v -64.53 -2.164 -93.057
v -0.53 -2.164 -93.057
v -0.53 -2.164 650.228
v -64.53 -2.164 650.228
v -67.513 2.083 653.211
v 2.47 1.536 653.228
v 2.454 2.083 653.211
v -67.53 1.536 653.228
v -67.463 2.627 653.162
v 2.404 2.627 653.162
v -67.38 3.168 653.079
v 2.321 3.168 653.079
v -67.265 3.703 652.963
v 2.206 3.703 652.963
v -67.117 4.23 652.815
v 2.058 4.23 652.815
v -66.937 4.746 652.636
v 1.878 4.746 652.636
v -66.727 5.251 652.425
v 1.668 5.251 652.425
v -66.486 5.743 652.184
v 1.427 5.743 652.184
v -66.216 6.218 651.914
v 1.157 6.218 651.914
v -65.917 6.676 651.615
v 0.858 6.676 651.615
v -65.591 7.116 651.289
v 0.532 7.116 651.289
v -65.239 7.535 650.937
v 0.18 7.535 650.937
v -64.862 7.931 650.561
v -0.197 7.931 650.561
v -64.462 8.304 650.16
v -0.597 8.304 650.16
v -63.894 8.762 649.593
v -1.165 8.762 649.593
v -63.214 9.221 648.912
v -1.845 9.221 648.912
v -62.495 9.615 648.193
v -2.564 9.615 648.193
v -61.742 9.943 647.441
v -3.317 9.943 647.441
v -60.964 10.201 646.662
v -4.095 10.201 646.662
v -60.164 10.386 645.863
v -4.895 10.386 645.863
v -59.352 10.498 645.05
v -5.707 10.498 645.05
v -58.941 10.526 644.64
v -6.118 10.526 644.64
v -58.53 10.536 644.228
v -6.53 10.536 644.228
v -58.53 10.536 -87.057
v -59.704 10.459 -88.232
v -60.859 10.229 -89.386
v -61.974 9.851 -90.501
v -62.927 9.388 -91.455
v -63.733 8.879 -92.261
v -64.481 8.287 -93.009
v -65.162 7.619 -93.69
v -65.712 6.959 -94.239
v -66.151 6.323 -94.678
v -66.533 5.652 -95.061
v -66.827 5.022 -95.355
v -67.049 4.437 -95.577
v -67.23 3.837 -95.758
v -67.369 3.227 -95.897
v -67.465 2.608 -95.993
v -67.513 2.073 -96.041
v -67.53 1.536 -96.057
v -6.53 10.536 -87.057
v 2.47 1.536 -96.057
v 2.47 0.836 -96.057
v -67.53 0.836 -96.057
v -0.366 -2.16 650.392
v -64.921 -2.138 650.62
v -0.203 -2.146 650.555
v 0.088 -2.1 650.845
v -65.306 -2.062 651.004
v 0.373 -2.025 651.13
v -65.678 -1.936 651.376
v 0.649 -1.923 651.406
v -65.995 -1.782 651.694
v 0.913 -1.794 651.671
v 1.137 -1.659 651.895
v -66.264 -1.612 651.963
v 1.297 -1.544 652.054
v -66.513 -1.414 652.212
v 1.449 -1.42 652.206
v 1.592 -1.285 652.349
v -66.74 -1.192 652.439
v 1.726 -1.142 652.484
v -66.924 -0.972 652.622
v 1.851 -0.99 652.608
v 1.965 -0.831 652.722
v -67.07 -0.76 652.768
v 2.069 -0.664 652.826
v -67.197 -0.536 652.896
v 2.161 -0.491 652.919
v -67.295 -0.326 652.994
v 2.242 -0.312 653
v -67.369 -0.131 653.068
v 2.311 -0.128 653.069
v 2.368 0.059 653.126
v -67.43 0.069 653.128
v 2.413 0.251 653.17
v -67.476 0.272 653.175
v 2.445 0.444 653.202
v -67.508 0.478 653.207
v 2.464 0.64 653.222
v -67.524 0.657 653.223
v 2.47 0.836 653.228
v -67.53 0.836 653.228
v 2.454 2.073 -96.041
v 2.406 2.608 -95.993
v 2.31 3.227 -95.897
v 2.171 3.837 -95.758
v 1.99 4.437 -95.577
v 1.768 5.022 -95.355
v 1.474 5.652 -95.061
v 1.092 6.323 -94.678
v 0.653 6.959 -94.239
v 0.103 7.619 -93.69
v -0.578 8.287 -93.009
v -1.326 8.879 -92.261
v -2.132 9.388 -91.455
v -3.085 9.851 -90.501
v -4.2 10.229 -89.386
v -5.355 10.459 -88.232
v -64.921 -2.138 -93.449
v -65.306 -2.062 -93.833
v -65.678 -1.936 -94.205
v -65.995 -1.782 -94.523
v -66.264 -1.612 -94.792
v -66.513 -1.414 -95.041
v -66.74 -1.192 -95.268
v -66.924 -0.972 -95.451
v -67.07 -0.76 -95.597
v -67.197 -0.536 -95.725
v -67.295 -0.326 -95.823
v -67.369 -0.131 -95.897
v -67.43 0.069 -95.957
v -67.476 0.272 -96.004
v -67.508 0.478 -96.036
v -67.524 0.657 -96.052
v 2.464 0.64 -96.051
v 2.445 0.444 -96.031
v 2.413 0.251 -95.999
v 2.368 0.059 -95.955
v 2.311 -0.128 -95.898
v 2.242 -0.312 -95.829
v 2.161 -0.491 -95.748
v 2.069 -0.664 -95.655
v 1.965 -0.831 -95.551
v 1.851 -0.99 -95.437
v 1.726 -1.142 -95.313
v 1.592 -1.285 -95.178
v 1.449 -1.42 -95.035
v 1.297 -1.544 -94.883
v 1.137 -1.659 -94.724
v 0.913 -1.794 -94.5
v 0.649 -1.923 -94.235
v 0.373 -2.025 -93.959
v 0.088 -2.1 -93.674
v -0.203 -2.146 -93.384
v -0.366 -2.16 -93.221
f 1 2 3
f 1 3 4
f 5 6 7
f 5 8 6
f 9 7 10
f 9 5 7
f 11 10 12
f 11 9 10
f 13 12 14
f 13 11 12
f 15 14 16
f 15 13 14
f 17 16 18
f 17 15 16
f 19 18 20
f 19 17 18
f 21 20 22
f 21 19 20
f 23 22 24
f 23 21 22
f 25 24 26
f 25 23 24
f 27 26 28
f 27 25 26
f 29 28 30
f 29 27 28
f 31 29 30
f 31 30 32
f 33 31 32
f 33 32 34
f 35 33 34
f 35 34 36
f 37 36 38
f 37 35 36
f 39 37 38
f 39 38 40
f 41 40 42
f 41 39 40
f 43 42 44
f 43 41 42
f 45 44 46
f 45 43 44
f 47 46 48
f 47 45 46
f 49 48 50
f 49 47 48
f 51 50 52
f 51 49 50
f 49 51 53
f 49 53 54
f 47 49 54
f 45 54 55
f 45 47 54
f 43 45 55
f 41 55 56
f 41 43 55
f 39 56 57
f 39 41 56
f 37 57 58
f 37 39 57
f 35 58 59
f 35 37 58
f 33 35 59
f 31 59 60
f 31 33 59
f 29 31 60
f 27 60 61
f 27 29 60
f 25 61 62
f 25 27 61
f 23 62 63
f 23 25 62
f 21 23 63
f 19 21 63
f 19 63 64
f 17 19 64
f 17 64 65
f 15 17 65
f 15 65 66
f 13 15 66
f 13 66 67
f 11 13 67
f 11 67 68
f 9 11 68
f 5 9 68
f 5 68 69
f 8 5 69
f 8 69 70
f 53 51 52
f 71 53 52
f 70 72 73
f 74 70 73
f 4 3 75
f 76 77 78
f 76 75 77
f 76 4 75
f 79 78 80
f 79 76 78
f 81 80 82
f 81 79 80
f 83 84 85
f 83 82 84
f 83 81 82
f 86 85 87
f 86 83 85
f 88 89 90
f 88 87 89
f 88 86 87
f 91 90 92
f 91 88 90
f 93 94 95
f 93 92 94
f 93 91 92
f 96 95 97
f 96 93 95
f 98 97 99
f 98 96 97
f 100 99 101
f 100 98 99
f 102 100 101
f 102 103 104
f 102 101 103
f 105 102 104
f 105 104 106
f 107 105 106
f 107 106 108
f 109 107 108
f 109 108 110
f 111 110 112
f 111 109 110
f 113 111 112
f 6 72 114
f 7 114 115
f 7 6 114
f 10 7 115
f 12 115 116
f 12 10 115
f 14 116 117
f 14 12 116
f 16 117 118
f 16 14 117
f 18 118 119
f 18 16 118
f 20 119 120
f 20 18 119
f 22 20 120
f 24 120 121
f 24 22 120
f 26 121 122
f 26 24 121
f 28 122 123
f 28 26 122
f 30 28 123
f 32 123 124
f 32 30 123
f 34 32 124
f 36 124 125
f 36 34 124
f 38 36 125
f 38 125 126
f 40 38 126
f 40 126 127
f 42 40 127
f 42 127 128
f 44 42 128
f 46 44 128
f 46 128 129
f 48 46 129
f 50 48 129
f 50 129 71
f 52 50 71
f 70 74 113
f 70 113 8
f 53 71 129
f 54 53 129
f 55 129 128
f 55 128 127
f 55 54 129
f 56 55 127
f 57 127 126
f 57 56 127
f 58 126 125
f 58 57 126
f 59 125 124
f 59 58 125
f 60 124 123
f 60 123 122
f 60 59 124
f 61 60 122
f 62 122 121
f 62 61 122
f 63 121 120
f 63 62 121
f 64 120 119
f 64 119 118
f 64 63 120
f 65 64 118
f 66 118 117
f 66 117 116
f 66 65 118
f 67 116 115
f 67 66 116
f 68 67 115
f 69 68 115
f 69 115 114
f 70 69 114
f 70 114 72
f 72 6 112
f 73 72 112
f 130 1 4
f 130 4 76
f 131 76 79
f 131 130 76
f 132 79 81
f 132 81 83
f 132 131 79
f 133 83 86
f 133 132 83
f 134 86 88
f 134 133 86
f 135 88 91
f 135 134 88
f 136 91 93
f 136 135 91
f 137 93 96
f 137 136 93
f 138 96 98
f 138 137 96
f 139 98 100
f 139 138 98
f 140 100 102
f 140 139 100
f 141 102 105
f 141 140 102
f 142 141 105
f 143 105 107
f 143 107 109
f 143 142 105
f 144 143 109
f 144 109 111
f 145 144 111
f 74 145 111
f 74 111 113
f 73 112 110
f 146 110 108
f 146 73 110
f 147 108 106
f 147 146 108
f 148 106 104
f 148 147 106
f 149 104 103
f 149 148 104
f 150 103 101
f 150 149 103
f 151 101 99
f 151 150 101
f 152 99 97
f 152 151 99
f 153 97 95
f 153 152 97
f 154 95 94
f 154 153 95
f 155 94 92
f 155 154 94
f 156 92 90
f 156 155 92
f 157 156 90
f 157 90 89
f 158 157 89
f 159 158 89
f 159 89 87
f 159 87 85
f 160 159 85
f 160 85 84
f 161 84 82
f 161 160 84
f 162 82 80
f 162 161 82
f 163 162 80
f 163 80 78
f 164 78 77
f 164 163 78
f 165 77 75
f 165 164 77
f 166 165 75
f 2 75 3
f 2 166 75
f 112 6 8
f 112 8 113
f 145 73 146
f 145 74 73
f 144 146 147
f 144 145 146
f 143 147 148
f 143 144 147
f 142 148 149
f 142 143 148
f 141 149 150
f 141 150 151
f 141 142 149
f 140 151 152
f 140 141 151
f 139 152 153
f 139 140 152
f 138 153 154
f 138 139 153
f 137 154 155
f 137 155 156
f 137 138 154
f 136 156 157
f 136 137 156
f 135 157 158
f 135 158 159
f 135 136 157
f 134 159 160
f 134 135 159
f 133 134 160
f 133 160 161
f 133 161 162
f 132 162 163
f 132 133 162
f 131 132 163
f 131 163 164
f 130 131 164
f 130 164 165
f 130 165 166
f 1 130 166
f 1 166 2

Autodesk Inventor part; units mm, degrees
ref_plane "YZ Plane" through (0, 0, 0) normal (1, 0, 0) x (0, 1, 0)
ref_plane "XZ Plane" through (0, 0, 0) normal (0, 1, 0) x (-1, 0, 0)
ref_plane "XY Plane" through (0, 0, 0) normal (0, 0, 1) x (1, 0, 0)
sketch "Sketch1" plane through (0, 0, 0) normal (0, 0, 1) x (1, 0, 0)
  line L0 (2.4705, -2.1641) -> (-67.5295, -2.1641)
  line L1 (-67.5295, -2.1641) -> (-67.5295, 10.5359)
  line L2 (-67.5295, 10.5359) -> (2.4705, 10.5359)
  line L3 (2.4705, 10.5359) -> (2.4705, -2.1641)
  dimension "d0" = 12.7
  dimension "d1" = 70
extrude "Extrusion1" add sketch "Sketch1" along normal blind 567.2
sketch "Sketch2" plane through (2.4705, -2.1641, 0) normal (1, 0, 0) x (0, 0, -1)
  line L0 (-567.3829, 6.35) -> (0, 6.35) construction
  line L1 (0, 12.7) -> (-567.2, 12.7) construction
  line L2 (-567.2, 12.7) -> (-567.2, 0) construction
  point P0 (-543.6, 6.35)
  point P1 (-33.6, 6.35)
  point P2 (-133.6, 6.35)
  point P3 (-238.6, 6.35)
  point P4 (-338.6, 6.35)
  point P5 (-443.6, 6.35)
  dimension "d4" = 6.35
  dimension "d5" = 23.6
  dimension "d6" = 100
  dimension "d7" = 105
  dimension "d8" = 100
  dimension "d9" = 105
  dimension "d10" = 100
  dimension "d11" = 33.6
  dimension "d12" = 567.3829
hole "Hole1" [suppressed]
sketch "Sketch3" plane through (0, 0, 567.2) normal (0, 0, 1) x (1, 0, 0)
  line L0 (-67.5295, -2.1641) -> (-67.5295, 10.5359) projected
  line L1 (-67.5295, 10.5359) -> (2.4705, 10.5359) projected
  line L2 (2.4705, -2.1641) -> (-67.5295, -2.1641) projected
  line L3 (2.4705, 10.5359) -> (2.4705, -2.1641) projected
extrude "Extrusion2" add sketch "Sketch3" along normal blind 150
sketch "Sketch4" plane through (0, 0, 0) normal (0, 0, -1) x (-1, 0, 0)
  line L0 (-2.4705, -2.1641) -> (67.5295, -2.1641) projected
  line L1 (67.5295, -2.1641) -> (67.5295, 10.5359) projected
  line L2 (67.5295, 10.5359) -> (-2.4705, 10.5359) projected
  line L3 (-2.4705, 10.5359) -> (-2.4705, -2.1641) projected
extrude "Extrusion3" add sketch "Sketch4" along normal blind 150
sketch "Sketch5" plane through (2.4705, -2.1641, 717.2) normal (1, 0, 0) x (0, 0, -1)
  circle A0 centre (73.972, 6.35) radius 3.9687 projected
  circle A1 centre (113.972, 6.35) radius 3.9687 projected
  circle A2 centre (748.257, 6.35) radius 3.9687 projected
  circle A3 centre (798.257, 6.35) radius 3.9687 projected
hole "Hole2" [suppressed]
sketch "Sketch6" plane through (2.4705, -2.1641, 717.2) normal (1, 0, 0) x (0, 0, -1)
  line L0 (867.2, 0) -> (0, 0) projected
  line L1 (0, 12.7) -> (0, 0) projected
  line L2 (0, 12.7) -> (867.2, 12.7) projected
  line L3 (63.972, 12.7) -> (63.972, 0)
  line L4 (63.972, 12.7) -> (0, 12.7)
  line L5 (0, 0) -> (63.972, 0)
  line L6 (0, 0) -> (0, 12.7)
  circle A0 centre (73.972, 6.35) radius 3.9687 projected
  dimension "d31" = 10
extrude "Extrusion4" cut sketch "Sketch6" against normal blind 70 contours L0 L1 L2 L3
sketch "Sketch7" plane through (2.4705, -2.1641, 653.228) normal (1, 0, 0) x (0, 0, -1)
  line L0 (803.228, 0) -> (0, 0) projected
  line L1 (0, 12.7) -> (803.228, 12.7) projected
  line L2 (803.228, 0) -> (803.228, 12.7) projected
  circle A0 centre (734.285, 6.35) radius 3.9687 projected
  line L3 (749.285, 12.7) -> (749.285, 0)
  line L4 (749.285, 0) -> (803.228, 0)
  line L5 (803.228, 1.1687) -> (803.228, 12.7)
  line L6 (803.228, 12.7) -> (749.285, 12.7)
  dimension "d34" = 15
extrude "Extrusion5" cut sketch "Sketch7" against normal blind 70 contours L0 L3 L1 L2
fillet "Fillet1" radius 3 4 edges at (2.4705, -2.1641, 278.5855) (-32.5295, -2.1641, -96.057) (-67.5295, -2.1641, 278.5855) (-32.5295, -2.1641, 653.228)
fillet "Fillet2" radius 9 4 edges at (-32.5295, 10.5359, 653.228) (-67.5295, 10.5359, 278.5855) (-32.5295, 10.5359, -96.057) (2.4705, 10.5359, 278.5855)
sketch "Sketch8" plane through (-67.5295, 0.8359, 238.6) normal (-1, 0, 0) x (0, 0, 1)
  line L0 (38.016, -32.096) -> (38.016, 13.904) projected
  line L1 (405.628, 9.7) -> (-325.657, 9.7) projected
  line L2 (38.016, 3.35) -> (67.7675, 3.35) construction
  line L3 (49.521, 11.9848) -> (49.521, 0.9719) construction
  point P0 (49.521, 3.35)
  dimension "d39" = 11.505
  dimension "d40" = 6.35
hole "Hole3" [suppressed]
sketch "Sketch9" plane through (2.4705, 0.8359, 338.6) normal (1, 0, 0) x (0, 0, -1)
  arc A0 (49.011, 3.658) -> (51.947, 3.658) centre (50.479, 3.35) ccw projected
hole "Hole4" [suppressed]
ref_plane "Work Plane1" through (-32.5295, -2.1641, 650.228) normal (-1, 0, 0) x (0, 0.9041723, -0.427168)
properties part number "Version 2 field plate"
